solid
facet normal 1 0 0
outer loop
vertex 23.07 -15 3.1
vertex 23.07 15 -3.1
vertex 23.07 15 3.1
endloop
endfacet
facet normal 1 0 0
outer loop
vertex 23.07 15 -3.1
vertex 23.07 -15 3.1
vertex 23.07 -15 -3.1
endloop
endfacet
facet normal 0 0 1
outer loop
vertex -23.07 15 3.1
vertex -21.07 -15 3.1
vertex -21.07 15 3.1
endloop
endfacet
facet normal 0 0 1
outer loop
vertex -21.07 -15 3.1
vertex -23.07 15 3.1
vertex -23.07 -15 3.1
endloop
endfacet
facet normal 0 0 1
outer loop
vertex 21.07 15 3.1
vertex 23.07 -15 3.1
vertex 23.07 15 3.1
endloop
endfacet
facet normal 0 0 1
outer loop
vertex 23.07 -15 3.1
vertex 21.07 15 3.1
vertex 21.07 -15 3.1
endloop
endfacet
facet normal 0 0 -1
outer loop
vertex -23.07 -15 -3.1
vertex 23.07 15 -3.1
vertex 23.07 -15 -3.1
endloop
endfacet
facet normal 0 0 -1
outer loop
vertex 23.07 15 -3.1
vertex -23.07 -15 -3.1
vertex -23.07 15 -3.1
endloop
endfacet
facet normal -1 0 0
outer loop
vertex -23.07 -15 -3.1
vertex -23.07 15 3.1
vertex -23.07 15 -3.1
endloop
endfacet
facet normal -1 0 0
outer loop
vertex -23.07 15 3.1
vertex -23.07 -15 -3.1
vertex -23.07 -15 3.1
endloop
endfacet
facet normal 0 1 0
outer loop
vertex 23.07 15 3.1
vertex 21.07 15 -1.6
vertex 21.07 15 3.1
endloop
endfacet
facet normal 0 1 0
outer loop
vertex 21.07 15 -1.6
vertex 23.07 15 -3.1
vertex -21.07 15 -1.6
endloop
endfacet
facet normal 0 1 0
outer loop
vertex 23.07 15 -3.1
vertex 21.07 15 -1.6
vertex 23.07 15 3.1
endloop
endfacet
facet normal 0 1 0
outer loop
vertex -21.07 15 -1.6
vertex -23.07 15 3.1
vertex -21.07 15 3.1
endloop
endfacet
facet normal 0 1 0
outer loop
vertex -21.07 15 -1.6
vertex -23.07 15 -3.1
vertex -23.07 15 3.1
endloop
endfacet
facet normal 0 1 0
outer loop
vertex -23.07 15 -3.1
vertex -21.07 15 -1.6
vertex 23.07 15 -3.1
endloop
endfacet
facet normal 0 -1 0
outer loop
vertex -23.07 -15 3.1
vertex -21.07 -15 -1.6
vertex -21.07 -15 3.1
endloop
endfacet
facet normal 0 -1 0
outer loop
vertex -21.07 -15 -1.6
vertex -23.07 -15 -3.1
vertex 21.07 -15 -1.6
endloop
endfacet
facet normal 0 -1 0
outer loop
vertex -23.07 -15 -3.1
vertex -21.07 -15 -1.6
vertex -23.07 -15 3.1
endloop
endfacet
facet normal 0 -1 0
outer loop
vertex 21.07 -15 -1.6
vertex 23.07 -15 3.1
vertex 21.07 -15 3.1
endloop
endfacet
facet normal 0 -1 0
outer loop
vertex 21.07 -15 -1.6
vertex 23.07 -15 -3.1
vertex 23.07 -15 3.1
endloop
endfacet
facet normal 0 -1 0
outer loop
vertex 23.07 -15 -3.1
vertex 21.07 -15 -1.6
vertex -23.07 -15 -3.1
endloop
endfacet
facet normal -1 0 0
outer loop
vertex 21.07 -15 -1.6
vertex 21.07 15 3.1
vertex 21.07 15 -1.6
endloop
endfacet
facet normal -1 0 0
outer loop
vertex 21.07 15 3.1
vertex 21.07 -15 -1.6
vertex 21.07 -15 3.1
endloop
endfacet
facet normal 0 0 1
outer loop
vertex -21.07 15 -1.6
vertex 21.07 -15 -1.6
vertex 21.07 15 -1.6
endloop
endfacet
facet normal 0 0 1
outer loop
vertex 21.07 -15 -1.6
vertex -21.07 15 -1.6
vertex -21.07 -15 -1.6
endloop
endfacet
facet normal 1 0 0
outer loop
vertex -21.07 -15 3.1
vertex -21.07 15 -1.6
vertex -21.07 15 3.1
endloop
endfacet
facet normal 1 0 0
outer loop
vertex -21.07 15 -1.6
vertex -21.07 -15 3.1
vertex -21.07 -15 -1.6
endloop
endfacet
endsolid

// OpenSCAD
joy_width = 26.4;
tcv_width = 15.54;

x_groove = joy_width + tcv_width + 0.2;

t = 6.2;
tg = 4.7;

difference(){
    cube([x_groove + 4, 30, t], center=true);
    translate([0, 0, (t - tg)/2])
    cube([x_groove, 30, tg], center=true);
}
